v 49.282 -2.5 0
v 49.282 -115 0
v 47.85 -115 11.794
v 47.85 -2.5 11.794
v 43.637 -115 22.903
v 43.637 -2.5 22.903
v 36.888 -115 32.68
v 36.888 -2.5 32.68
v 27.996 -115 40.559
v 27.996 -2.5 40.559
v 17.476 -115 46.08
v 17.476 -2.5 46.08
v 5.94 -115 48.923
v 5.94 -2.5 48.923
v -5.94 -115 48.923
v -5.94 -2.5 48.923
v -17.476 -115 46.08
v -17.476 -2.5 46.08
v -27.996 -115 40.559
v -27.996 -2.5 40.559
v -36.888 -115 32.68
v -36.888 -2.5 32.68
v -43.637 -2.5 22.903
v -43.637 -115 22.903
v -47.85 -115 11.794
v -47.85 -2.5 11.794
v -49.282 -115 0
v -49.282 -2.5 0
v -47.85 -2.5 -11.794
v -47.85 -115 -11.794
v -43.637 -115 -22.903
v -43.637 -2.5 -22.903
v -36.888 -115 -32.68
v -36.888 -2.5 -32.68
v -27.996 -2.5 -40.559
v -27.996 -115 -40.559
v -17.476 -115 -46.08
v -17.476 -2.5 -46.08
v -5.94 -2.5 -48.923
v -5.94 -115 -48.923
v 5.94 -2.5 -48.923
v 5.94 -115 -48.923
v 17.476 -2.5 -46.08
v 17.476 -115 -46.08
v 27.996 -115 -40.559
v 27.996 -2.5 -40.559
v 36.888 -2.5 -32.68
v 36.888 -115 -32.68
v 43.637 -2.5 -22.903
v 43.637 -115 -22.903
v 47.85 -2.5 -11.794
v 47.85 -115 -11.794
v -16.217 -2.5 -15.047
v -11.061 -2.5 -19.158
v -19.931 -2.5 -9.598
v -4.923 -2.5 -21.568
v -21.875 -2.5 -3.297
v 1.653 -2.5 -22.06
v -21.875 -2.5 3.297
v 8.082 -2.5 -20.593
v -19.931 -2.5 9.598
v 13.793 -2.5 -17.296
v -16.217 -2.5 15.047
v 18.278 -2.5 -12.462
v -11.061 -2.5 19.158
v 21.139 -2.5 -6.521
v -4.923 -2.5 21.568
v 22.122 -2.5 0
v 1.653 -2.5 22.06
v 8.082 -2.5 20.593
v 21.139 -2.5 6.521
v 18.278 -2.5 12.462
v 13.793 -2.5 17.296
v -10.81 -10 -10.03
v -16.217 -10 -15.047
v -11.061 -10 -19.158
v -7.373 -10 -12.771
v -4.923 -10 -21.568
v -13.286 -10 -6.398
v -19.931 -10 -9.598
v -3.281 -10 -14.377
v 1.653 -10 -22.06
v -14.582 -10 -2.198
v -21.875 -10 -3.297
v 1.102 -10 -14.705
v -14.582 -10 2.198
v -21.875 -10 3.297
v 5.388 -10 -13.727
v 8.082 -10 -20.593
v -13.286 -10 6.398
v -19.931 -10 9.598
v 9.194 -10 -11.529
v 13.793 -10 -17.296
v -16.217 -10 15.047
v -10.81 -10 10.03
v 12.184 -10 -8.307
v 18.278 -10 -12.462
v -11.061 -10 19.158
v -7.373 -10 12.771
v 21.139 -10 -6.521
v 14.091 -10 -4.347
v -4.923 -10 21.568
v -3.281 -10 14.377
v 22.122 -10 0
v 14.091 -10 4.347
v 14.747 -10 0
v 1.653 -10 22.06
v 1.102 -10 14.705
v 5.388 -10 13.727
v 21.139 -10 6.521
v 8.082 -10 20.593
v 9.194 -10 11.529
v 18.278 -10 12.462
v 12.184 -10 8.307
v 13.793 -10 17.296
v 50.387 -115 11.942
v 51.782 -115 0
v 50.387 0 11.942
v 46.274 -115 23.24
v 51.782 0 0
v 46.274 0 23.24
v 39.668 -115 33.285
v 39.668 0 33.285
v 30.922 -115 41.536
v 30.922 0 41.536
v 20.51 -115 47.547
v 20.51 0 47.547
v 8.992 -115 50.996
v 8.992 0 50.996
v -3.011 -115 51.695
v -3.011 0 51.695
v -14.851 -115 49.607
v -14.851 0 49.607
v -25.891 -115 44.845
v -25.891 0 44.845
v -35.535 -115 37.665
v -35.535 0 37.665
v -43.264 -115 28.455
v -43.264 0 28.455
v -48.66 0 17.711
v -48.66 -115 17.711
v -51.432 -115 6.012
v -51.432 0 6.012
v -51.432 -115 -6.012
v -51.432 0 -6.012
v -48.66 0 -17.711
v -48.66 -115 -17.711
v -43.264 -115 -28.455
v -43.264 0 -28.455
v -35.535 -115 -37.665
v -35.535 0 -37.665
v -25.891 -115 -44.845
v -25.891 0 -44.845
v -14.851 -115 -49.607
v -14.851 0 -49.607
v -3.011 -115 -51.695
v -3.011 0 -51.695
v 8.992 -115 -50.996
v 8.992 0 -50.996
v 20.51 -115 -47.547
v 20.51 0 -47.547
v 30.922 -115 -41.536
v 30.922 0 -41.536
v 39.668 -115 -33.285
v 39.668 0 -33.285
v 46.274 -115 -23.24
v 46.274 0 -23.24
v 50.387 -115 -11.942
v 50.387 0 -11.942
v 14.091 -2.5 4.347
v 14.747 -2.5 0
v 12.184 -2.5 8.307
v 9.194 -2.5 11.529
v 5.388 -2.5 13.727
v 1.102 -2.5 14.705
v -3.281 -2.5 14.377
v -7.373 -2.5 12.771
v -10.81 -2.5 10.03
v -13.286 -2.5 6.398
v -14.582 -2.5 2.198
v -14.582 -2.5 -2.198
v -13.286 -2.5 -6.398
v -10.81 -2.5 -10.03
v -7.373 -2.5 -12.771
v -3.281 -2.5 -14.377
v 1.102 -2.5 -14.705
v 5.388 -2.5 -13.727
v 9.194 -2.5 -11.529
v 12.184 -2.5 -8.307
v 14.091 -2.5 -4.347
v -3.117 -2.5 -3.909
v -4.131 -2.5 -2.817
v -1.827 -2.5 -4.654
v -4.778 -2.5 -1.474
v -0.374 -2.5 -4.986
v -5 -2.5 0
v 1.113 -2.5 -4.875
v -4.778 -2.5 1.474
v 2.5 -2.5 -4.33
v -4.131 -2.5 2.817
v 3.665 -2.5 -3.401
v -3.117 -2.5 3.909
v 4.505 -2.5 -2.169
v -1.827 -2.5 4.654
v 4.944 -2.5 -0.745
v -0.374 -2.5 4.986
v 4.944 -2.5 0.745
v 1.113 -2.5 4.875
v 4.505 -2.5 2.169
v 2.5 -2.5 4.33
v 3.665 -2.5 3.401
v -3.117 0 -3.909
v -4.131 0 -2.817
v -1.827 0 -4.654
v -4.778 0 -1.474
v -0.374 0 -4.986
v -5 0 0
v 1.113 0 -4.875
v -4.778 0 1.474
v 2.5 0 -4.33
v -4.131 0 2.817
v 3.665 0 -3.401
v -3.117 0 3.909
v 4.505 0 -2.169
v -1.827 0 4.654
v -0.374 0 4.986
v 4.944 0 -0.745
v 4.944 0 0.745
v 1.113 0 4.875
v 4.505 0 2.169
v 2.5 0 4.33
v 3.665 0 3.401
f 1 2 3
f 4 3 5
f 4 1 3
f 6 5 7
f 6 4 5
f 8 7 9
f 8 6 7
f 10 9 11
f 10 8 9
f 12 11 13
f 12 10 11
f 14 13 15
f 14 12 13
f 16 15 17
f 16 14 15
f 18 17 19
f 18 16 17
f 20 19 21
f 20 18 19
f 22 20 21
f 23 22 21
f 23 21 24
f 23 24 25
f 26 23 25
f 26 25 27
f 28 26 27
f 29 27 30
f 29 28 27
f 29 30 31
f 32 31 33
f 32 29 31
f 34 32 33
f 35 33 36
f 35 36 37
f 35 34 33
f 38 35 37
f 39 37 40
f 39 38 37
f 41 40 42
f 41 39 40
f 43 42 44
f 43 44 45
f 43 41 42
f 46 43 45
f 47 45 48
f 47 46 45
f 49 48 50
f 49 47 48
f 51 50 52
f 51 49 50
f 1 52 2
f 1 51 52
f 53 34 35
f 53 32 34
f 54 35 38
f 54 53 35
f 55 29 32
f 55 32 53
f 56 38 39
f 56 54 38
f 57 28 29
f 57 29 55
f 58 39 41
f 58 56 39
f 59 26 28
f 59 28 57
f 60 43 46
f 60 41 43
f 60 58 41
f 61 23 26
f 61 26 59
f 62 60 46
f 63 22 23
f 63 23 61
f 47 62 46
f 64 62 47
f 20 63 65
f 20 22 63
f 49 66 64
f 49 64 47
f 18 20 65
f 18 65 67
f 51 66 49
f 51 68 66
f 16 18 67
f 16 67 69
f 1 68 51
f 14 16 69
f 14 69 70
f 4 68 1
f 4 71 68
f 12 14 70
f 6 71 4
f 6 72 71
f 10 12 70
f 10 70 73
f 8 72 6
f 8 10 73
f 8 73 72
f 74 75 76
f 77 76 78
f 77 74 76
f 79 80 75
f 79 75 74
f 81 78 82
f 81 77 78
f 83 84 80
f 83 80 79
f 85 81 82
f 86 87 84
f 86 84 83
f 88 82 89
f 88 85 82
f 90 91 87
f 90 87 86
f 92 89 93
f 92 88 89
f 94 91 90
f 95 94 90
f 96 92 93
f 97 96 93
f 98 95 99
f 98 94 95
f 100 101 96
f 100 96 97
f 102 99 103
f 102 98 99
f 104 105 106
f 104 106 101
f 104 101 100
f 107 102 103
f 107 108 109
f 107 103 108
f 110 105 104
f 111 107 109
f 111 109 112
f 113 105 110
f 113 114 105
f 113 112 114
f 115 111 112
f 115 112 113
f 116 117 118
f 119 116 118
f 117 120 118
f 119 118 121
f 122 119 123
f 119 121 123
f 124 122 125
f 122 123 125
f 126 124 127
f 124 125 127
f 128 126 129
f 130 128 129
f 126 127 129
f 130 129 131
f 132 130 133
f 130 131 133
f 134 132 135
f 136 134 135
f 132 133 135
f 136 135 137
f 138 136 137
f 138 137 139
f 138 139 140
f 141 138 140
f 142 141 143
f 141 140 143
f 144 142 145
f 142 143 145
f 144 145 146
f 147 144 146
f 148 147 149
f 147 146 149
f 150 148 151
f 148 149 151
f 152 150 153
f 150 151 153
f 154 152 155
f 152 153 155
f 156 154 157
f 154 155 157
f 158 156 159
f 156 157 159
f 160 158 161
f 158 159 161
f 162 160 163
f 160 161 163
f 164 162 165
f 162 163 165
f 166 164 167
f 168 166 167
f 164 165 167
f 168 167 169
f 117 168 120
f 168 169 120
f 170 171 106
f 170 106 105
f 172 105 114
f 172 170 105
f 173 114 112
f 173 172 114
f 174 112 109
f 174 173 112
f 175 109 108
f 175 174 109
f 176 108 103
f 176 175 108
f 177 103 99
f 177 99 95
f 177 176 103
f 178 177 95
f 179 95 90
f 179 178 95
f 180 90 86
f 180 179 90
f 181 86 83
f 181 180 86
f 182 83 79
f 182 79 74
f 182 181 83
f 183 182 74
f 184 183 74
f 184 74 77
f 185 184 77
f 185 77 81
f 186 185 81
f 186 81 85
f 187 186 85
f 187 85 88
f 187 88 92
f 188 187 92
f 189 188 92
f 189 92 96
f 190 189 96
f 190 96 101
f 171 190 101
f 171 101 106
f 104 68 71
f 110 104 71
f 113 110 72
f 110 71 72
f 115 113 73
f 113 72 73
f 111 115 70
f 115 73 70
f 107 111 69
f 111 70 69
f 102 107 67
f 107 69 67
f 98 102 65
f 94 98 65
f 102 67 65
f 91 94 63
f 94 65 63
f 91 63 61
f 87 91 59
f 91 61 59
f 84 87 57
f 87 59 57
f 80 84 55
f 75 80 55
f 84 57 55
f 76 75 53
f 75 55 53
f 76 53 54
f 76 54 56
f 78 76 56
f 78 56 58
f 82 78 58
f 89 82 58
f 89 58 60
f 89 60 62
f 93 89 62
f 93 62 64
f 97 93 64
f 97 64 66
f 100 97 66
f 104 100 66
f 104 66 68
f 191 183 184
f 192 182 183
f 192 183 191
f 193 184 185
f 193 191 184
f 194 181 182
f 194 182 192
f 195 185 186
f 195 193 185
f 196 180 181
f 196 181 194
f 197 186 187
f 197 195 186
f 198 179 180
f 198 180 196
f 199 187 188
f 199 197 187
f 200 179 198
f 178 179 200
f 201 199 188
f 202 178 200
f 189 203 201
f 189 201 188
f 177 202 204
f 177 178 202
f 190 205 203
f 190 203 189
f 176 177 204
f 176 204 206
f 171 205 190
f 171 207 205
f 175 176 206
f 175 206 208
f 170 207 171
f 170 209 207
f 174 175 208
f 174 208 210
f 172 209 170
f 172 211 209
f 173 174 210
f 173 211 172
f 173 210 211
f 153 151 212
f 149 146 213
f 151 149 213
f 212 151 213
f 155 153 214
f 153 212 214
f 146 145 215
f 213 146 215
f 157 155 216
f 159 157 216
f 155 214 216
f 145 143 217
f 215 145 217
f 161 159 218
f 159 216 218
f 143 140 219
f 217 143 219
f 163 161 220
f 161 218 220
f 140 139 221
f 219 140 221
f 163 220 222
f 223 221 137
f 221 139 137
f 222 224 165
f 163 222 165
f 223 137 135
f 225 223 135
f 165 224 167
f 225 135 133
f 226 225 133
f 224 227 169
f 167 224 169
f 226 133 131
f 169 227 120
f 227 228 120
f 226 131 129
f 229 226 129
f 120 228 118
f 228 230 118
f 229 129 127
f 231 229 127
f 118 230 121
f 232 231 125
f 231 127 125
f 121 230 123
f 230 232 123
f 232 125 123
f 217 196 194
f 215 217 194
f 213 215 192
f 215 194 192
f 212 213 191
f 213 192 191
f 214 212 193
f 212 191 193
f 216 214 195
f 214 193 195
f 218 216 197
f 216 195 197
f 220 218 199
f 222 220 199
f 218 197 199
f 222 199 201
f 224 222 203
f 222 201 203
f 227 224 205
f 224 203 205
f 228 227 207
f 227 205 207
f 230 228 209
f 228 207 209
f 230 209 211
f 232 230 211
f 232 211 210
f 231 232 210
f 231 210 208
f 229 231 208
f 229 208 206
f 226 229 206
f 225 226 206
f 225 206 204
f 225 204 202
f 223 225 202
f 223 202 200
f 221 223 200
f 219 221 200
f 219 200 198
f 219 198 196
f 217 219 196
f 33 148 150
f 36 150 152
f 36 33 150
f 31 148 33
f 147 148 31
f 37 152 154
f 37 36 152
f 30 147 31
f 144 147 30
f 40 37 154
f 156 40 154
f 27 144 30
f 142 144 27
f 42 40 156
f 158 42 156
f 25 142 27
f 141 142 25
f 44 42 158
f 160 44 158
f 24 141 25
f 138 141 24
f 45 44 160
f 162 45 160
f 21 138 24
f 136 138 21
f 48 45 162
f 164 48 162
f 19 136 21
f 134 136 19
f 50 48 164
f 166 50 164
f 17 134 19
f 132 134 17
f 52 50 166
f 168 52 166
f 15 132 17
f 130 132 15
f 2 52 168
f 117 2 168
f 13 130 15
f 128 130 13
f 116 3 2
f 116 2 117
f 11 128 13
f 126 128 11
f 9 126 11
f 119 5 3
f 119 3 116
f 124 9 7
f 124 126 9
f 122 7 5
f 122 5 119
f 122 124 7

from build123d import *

# Parameters (mm, degrees)
F0_R           = 51.7823878283
F1_DEPTH       = 100
F2_T           = -2.5
F3_R           = 22.1222661474
F3_R_2         = 14.7466183109
F4_DEPTH       = 10
F6_D           = 10
F6_CBORE_D     = 10
F6_CBORE_DEPTH = 5
F7_DEPTH       = 5
F8_DEPTH       = 10


with BuildPart() as f1:
    # F0 (on Front) → F1 (new body)
    with BuildSketch(Plane.XZ):
        Circle(F0_R)
    extrude(amount=F1_DEPTH)

    # F2
    f2_openings = [f1.faces().sort_by_distance(p)[0] for p in [
        (0, -100, 0),
    ]]
    offset(amount=F2_T, openings=f2_openings)

    # F3 (on Front) → F4 (join)
    with BuildSketch(Plane.XZ):
        Circle(F3_R)
        Circle(F3_R_2, mode=Mode.SUBTRACT)
    extrude(amount=F4_DEPTH)

    # F6 (through all)
    with Locations(Plane(origin=(0, 0, 0), x_dir=(1, 0, 0), z_dir=(0, 1, 0))):
        with Locations((0, 0)):
            CounterBoreHole(F6_D / 2, F6_CBORE_D / 2, F6_CBORE_DEPTH)

    # F7 (add): a face of the model
    f7_faces = [f1.faces().sort_by_distance(p)[0] for p in [
        (-50.3177607251, -100, 0),
    ]]
    extrude(f7_faces, amount=F7_DEPTH)

    # F8 (add): a face of the model
    f8_faces = [f1.faces().sort_by_distance(p)[0] for p in [
        (-50.3177607251, -105, 0),
    ]]
    extrude(f8_faces, amount=F8_DEPTH)


solid = f1.part
